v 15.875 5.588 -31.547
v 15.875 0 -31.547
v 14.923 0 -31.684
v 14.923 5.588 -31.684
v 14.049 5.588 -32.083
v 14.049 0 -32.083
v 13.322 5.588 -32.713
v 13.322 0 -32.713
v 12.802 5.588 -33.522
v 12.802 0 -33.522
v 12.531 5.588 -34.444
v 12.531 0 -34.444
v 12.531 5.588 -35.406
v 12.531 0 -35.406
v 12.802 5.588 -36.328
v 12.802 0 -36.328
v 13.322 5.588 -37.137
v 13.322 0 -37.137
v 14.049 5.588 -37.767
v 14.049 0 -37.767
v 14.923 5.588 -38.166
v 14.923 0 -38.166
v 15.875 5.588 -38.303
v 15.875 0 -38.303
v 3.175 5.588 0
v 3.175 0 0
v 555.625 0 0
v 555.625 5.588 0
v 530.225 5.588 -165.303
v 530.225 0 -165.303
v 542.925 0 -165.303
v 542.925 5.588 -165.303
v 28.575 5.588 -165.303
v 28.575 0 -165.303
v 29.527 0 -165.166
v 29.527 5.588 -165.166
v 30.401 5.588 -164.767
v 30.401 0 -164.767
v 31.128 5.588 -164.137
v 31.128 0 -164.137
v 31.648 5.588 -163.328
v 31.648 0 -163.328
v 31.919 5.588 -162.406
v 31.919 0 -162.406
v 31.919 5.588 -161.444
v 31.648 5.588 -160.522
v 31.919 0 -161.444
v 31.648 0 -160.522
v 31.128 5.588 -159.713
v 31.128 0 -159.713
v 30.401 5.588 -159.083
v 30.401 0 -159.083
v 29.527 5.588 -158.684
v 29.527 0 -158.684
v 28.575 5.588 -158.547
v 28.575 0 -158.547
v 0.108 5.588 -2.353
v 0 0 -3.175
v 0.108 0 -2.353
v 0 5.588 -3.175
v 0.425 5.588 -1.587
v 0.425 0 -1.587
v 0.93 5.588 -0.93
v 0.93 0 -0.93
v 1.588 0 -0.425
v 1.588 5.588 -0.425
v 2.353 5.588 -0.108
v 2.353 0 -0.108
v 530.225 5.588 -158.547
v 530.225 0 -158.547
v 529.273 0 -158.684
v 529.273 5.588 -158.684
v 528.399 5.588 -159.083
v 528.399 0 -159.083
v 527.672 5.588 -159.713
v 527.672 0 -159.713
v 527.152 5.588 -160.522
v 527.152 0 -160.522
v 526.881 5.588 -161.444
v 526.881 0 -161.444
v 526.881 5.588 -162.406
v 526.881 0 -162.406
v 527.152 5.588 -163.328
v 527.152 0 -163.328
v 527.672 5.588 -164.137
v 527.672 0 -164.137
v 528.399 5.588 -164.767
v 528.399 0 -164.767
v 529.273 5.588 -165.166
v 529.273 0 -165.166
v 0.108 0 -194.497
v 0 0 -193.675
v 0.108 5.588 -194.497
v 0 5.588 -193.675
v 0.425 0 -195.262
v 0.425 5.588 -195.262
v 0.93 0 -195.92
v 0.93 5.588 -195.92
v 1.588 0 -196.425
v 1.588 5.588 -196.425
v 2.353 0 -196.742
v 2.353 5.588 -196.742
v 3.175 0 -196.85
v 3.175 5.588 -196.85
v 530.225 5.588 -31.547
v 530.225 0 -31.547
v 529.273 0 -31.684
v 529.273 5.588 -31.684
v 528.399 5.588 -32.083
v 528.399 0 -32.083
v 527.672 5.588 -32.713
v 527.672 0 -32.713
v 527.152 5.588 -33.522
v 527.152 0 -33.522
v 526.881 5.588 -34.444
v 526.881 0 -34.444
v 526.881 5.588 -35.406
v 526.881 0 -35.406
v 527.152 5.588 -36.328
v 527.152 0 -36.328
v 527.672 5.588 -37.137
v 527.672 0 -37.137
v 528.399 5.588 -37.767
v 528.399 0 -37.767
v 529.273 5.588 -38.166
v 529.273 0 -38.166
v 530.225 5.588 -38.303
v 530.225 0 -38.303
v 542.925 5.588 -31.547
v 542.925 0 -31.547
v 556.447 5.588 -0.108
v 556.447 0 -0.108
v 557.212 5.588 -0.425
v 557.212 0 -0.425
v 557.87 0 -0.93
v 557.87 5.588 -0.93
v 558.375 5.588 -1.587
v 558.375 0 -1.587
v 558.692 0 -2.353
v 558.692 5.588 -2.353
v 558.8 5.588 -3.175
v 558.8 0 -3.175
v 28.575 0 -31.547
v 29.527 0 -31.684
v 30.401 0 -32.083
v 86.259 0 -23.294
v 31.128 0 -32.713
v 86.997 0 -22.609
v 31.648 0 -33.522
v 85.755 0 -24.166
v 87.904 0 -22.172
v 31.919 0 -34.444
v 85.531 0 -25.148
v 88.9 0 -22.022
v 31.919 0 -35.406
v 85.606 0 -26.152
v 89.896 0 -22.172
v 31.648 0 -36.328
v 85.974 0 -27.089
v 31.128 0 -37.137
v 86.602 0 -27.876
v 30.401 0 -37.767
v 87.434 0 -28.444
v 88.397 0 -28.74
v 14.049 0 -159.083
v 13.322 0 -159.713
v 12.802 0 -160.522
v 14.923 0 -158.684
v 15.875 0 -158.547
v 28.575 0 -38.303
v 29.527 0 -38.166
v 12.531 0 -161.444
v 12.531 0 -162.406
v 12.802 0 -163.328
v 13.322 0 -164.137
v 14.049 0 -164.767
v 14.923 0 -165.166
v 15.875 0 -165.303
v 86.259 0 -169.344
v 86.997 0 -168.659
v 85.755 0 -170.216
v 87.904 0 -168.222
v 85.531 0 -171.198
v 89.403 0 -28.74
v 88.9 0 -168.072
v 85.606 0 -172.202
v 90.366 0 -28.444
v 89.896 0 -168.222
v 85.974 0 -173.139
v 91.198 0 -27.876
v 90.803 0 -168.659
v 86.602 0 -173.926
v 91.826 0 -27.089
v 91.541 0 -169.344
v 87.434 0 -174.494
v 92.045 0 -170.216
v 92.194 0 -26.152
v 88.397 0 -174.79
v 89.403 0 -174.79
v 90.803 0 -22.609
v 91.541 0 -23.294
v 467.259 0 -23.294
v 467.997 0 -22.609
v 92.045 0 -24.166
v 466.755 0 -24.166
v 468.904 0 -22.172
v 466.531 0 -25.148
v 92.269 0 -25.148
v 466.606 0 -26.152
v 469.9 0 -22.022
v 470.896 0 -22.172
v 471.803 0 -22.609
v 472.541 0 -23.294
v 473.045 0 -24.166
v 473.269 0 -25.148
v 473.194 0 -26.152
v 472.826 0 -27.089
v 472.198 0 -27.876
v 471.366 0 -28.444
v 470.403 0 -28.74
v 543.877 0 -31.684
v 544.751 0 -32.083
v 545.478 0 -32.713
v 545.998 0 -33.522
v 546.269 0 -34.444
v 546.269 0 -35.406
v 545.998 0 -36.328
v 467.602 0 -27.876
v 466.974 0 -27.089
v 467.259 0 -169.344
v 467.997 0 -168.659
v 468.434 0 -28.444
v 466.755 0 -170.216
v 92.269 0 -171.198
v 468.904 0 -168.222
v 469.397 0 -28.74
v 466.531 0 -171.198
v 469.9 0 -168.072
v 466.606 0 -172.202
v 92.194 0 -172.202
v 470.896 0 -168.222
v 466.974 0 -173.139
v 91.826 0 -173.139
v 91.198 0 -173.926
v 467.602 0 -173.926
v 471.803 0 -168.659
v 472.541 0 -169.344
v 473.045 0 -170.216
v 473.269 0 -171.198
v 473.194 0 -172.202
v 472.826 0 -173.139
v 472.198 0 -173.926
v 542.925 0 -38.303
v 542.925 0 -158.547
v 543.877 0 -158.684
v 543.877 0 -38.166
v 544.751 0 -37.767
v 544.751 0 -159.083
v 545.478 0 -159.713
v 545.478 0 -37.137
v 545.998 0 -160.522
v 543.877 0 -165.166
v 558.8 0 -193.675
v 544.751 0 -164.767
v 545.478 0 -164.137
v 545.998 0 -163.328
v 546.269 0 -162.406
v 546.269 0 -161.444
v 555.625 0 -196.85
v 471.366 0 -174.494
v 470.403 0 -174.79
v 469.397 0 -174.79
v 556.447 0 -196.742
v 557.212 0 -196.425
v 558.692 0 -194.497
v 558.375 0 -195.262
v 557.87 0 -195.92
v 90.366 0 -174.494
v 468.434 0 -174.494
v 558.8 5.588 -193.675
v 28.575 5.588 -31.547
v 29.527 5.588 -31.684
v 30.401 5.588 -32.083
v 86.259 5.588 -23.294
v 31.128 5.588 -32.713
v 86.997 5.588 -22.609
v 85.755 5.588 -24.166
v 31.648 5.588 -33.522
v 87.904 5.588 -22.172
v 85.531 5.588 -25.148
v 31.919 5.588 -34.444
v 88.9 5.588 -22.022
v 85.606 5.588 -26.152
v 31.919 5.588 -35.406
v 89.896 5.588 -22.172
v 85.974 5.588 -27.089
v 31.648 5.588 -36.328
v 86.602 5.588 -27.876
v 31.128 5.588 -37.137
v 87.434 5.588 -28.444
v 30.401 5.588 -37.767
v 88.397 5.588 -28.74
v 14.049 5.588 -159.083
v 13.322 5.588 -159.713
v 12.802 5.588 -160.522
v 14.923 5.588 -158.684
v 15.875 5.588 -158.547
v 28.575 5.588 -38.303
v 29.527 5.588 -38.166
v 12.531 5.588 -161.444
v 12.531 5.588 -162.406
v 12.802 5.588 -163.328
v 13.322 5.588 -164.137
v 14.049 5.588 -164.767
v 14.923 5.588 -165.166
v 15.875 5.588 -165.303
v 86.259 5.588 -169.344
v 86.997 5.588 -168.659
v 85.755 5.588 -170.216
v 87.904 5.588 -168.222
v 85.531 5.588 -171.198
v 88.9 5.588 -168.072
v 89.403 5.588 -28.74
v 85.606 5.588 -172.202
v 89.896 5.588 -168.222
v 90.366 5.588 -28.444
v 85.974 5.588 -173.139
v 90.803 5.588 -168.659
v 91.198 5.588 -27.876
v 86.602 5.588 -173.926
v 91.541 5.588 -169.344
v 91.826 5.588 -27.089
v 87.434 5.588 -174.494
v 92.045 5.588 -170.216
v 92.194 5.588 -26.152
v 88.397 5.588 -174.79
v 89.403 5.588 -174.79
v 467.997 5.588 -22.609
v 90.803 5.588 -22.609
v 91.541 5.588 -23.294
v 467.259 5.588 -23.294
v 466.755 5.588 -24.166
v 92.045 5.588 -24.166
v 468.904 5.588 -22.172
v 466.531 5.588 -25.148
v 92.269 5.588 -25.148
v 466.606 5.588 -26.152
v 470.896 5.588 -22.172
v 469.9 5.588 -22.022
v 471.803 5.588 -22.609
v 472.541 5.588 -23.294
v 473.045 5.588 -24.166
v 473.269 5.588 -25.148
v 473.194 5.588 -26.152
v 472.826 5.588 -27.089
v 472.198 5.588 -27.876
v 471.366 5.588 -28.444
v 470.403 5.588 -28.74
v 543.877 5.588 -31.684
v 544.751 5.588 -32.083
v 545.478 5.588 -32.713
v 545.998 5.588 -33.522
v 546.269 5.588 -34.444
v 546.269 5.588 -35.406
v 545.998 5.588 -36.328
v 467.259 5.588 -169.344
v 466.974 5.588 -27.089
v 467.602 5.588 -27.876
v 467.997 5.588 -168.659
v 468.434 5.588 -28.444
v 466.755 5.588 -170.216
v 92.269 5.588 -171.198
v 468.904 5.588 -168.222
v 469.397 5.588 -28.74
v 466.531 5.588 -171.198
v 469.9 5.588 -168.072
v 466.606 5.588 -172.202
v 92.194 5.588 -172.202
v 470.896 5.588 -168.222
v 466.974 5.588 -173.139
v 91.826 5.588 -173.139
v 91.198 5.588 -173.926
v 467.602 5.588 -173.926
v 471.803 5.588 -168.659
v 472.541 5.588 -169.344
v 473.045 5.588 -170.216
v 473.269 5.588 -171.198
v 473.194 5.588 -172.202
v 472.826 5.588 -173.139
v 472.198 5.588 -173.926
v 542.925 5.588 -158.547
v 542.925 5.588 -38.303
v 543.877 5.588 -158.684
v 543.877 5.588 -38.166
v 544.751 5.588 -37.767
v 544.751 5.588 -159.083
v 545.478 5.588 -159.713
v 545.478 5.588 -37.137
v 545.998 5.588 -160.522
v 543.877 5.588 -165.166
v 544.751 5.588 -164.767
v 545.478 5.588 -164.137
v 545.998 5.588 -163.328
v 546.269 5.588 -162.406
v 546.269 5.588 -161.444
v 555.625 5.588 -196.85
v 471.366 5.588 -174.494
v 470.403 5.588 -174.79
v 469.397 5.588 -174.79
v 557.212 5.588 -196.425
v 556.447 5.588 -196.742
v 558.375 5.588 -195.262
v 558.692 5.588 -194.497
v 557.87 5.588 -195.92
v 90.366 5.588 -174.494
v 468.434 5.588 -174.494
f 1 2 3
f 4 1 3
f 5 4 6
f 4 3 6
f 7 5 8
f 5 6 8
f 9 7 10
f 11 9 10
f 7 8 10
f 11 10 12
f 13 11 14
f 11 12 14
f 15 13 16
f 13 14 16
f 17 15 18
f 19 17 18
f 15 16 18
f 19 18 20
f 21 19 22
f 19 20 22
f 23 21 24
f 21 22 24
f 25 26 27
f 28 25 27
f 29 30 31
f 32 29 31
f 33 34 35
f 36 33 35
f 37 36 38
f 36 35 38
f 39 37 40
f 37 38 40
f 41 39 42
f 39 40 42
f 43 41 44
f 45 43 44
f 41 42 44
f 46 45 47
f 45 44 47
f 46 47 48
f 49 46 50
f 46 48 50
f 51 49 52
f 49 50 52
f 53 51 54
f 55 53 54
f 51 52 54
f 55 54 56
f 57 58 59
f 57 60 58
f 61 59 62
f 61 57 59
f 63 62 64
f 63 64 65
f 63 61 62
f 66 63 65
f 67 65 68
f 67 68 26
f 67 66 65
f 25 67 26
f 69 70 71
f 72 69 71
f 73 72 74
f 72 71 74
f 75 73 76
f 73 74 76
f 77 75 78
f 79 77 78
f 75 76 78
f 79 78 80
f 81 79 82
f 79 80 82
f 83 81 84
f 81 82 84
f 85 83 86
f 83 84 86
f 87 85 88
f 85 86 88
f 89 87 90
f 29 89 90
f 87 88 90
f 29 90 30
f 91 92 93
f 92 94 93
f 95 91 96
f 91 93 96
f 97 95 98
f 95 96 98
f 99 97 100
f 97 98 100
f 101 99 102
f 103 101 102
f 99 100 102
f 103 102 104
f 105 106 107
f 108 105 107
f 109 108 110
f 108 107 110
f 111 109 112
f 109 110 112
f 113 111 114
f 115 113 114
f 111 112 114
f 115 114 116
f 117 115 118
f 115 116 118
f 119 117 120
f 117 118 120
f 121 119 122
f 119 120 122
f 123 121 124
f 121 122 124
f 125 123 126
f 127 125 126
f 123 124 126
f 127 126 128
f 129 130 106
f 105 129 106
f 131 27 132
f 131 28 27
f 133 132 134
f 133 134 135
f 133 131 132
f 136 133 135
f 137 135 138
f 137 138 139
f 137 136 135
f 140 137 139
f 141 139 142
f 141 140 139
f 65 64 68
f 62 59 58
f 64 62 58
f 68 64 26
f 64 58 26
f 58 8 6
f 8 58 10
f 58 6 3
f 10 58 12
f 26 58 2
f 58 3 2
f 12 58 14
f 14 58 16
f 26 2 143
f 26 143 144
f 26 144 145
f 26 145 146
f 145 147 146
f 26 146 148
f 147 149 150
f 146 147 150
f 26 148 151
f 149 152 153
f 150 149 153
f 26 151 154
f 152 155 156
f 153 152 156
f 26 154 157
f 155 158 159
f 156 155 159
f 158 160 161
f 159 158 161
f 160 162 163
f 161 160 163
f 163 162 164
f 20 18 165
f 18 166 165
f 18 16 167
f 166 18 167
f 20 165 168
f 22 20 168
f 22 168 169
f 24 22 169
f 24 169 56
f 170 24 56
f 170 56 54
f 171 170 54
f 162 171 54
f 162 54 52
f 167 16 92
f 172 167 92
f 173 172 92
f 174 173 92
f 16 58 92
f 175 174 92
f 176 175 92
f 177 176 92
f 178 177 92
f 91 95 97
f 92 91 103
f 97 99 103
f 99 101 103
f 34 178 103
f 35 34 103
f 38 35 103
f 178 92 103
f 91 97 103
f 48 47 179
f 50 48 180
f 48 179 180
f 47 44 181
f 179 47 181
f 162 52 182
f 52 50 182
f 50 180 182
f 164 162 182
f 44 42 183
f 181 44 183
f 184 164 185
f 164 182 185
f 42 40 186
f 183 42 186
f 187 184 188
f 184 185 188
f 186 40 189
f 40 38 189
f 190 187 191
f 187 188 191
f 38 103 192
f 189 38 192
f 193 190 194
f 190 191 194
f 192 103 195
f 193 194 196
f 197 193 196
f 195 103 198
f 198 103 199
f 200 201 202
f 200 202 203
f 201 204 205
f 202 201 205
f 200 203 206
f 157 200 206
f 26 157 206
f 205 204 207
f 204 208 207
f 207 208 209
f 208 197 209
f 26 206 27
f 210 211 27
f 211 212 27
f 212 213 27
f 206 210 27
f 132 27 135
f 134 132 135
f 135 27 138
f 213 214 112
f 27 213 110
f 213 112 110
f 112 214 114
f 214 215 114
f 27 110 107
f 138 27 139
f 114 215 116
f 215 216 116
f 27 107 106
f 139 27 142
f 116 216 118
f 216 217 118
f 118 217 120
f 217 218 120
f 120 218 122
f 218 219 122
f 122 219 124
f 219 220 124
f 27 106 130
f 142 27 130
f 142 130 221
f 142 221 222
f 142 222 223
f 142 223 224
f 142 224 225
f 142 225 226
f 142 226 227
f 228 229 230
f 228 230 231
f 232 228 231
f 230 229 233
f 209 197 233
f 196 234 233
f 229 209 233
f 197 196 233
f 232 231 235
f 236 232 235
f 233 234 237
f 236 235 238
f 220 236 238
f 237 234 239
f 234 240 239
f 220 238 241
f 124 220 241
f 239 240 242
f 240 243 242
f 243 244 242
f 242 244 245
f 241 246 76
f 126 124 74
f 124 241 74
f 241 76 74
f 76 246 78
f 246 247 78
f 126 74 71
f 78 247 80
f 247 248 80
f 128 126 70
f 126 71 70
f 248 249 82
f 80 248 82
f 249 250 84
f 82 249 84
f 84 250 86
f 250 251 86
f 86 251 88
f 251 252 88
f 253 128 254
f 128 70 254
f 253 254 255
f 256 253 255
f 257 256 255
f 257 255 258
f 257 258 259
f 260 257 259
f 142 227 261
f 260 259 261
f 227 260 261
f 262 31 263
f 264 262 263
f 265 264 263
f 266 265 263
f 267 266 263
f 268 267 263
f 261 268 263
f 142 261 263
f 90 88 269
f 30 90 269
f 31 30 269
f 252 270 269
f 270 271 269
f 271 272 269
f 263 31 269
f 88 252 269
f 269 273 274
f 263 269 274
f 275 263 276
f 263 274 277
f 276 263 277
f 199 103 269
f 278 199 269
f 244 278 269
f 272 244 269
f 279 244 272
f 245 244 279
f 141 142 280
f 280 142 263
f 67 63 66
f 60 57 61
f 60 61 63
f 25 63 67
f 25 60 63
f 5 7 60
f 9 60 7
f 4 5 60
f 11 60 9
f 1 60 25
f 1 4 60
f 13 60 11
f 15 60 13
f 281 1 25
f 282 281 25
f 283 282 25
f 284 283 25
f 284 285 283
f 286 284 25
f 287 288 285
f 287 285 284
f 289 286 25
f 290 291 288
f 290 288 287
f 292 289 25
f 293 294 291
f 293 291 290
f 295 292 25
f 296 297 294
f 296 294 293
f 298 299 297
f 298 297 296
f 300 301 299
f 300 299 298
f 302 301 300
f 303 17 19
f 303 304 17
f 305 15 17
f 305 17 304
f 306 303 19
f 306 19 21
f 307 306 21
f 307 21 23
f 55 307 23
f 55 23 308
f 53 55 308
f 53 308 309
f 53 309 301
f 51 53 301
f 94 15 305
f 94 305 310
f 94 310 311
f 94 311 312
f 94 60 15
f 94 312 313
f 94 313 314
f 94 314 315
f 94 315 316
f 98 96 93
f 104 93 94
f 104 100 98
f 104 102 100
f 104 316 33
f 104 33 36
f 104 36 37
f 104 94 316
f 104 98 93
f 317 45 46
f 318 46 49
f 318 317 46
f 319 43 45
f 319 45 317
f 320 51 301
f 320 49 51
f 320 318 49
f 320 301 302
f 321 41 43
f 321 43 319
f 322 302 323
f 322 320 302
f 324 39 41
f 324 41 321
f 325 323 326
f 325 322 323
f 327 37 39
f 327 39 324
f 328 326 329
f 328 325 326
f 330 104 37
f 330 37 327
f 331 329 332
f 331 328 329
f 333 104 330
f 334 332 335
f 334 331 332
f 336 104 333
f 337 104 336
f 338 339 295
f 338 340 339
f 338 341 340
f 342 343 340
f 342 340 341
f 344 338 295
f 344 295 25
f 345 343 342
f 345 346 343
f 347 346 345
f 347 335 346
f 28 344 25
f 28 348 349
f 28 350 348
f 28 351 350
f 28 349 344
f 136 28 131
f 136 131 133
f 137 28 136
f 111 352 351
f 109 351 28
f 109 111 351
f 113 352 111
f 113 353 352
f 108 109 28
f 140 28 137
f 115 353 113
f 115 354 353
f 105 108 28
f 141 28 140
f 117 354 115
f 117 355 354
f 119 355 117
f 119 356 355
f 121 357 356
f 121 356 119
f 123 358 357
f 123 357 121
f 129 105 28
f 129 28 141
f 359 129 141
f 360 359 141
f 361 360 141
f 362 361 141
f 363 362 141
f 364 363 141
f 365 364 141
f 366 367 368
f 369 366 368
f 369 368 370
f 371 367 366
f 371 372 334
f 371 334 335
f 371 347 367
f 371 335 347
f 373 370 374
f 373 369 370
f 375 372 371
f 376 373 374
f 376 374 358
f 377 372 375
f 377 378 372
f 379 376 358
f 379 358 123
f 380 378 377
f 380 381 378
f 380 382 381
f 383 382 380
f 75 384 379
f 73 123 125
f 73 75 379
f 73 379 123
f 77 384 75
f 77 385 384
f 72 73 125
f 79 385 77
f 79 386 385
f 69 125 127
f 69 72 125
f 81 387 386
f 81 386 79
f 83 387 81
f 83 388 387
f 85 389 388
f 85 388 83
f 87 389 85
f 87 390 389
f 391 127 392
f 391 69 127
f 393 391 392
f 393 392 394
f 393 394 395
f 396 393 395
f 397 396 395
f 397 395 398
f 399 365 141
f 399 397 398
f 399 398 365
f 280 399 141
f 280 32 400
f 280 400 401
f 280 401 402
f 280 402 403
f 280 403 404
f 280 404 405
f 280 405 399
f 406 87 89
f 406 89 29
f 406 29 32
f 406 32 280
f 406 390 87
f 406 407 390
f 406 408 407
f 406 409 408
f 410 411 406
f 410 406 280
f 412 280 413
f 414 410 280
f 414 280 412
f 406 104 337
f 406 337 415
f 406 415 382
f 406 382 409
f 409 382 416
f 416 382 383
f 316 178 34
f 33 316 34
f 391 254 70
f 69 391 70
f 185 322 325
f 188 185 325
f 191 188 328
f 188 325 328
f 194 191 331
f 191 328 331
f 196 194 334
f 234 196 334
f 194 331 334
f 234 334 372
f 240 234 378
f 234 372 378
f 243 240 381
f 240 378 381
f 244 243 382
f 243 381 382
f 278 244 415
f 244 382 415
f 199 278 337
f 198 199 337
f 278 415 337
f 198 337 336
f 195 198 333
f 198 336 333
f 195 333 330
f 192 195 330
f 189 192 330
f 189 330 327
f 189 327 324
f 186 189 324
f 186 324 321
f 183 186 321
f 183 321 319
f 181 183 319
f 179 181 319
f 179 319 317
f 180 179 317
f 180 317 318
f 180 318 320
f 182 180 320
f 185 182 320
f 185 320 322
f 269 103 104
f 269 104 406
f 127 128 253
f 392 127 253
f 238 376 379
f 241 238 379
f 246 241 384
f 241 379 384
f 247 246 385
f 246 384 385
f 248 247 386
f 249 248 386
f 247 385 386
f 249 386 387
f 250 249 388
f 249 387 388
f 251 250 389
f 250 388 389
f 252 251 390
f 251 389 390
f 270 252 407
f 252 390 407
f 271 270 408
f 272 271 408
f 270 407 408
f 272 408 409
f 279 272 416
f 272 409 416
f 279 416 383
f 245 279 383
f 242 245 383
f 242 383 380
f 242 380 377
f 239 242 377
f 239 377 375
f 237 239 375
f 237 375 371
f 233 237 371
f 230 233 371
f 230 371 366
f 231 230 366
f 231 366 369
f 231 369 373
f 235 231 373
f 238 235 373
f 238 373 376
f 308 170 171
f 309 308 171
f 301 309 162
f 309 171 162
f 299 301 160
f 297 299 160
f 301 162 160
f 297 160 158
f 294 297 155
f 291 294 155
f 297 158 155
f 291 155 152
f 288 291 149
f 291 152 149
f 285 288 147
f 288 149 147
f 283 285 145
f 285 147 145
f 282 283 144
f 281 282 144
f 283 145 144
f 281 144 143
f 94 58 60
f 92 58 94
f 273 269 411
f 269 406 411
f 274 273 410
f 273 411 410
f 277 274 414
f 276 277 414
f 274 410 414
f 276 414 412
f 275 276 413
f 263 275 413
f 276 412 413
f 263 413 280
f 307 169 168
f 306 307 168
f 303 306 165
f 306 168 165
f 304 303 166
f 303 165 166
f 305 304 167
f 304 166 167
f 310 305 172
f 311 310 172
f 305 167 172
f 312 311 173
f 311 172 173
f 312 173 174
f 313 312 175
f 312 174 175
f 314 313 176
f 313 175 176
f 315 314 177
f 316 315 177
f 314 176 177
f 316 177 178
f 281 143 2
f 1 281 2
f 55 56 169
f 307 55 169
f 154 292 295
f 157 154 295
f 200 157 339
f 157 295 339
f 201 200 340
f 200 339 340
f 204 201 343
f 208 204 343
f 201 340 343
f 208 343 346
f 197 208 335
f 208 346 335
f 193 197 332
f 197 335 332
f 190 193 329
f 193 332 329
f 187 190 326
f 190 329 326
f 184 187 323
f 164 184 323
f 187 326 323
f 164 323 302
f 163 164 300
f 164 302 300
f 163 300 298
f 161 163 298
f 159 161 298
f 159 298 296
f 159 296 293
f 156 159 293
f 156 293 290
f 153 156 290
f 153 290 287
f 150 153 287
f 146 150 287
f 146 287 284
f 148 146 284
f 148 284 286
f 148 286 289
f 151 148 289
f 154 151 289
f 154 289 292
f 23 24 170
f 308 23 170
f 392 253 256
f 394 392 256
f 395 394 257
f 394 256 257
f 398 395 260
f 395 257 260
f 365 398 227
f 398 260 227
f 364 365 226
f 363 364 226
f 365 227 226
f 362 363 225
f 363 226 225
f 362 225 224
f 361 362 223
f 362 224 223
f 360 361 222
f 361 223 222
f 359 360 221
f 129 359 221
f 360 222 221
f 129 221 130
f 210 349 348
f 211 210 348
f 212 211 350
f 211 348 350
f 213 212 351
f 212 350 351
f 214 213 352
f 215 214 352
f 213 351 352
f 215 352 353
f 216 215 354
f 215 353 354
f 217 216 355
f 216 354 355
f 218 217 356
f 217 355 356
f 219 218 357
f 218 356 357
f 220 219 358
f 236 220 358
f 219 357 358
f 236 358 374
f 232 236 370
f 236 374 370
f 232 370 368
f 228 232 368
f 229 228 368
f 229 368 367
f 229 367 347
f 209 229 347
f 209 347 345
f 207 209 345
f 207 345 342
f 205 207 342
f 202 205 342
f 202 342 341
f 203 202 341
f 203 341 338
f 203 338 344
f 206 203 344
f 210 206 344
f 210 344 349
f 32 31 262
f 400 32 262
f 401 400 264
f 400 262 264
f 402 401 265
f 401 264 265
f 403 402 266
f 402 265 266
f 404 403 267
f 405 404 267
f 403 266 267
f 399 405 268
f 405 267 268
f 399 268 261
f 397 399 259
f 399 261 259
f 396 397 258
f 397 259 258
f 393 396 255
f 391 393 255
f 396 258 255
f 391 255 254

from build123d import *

# Parameters (mm, degrees)
SKETCH1_W           = 558.8
SKETCH1_H           = 196.85
BOSS_EXTRUDE1_DEPTH = 5.588
FILLET1_R           = 3.175
SKETCH2_R           = 3.3782
CUT_EXTRUDE1_DEPTH  = 593.485095377


with BuildPart() as part:
    # Sketch1 → Boss-Extrude1 (new body)
    with BuildSketch(Plane(origin=(0, 0, 0), x_dir=(1, 0, 0), z_dir=(0, 1, 0))):
        with Locations((279.4, 98.425)):
            Rectangle(SKETCH1_W, SKETCH1_H)
        with BuildLine():
            Line((15.875, 38.3032), (28.575, 38.3032))
            ThreePointArc((28.575, 38.3032), (31.9532, 34.925), (28.575, 31.5468))
            Line((28.575, 31.5468), (15.875, 31.5468))
            ThreePointArc((15.875, 31.5468), (12.4968, 34.925), (15.875, 38.3032))
        make_face(mode=Mode.SUBTRACT)
        with BuildLine():
            Line((15.875, 165.3032), (28.575, 165.3032))
            ThreePointArc((28.575, 165.3032), (31.9532, 161.925), (28.575, 158.5468))
            Line((28.575, 158.5468), (15.875, 158.5468))
            ThreePointArc((15.875, 158.5468), (12.4968, 161.925), (15.875, 165.3032))
        make_face(mode=Mode.SUBTRACT)
        with BuildLine():
            Line((542.925, 158.5468), (530.225, 158.5468))
            ThreePointArc((530.225, 158.5468), (526.8468, 161.925), (530.225, 165.3032))
            Line((530.225, 165.3032), (542.925, 165.3032))
            ThreePointArc((542.925, 165.3032), (546.3032, 161.925), (542.925, 158.5468))
        make_face(mode=Mode.SUBTRACT)
        with BuildLine():
            Line((542.925, 31.5468), (530.225, 31.5468))
            ThreePointArc((530.225, 31.5468), (526.8468, 34.925), (530.225, 38.3032))
            Line((530.225, 38.3032), (542.925, 38.3032))
            ThreePointArc((542.925, 38.3032), (546.3032, 34.925), (542.925, 31.5468))
        make_face(mode=Mode.SUBTRACT)
    extrude(amount=BOSS_EXTRUDE1_DEPTH)

    # Fillet1
    fillet1_edges = [part.edges().sort_by_distance(p)[0] for p in [
        (0, 2.794, -196.85),
        (558.8, 2.794, -196.85),
        (558.8, 2.794, 0),
        (0, 2.794, 0),
    ]]
    fillet(fillet1_edges, radius=FILLET1_R)

    # Sketch2 → Cut-Extrude1 (cut, through all)
    with BuildSketch(Plane(origin=(0, 5.588, 0), x_dir=(1, 0, 0), z_dir=(0, 1, 0))):
        with Locations(Location((88.9, 171.45, 0), (0, 0, 270))):
            Circle(SKETCH2_R)
        with Locations(Location((88.9, 25.4, 0), (0, 0, 270))):
            Circle(SKETCH2_R)
        with Locations(Location((469.9, 25.4, 0), (0, 0, 270))):
            Circle(SKETCH2_R)
        with Locations(Location((469.9, 171.45, 0), (0, 0, 270))):
            Circle(SKETCH2_R)
    extrude(amount=-CUT_EXTRUDE1_DEPTH, mode=Mode.SUBTRACT)


solid = part.part
